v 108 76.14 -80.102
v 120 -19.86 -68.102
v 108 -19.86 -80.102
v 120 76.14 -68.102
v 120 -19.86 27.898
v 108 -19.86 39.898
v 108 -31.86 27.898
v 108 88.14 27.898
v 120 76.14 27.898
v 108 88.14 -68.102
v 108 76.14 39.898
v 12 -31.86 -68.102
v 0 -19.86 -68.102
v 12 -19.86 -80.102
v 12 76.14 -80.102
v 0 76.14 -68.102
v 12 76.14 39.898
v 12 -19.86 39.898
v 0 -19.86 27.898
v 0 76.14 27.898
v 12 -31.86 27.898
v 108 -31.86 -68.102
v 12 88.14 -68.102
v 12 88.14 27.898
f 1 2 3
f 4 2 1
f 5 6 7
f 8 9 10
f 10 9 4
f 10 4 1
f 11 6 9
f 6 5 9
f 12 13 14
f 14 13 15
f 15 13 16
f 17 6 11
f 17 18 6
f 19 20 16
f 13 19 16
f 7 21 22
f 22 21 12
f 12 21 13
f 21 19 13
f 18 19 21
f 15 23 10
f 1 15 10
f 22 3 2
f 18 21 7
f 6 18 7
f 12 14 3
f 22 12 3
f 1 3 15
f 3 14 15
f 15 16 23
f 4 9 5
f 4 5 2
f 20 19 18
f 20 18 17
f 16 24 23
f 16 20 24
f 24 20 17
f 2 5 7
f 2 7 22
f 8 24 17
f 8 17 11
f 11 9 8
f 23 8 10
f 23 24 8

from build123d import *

# Parameters (mm, degrees)
SKETCH_1_W      = 120
SKETCH_1_H      = 120
EXTRUDE_1_DEPTH = 120
CHAMFER_1_SIZE  = 12


with BuildPart() as part:
    # 草图1 → 凸台-拉伸1 (new body)
    with BuildSketch(Plane(origin=(0, 0, 0), x_dir=(0, 0, -1), z_dir=(1, 0, 0))):
        with Locations((20.102245328, 28.139540774)):
            Rectangle(SKETCH_1_W, SKETCH_1_H)
    extrude(amount=EXTRUDE_1_DEPTH)

    # 倒角1
    chamfer_1_edges = [part.edges().sort_by_distance(p)[0] for p in [
        (120, 28.139540774, -80.102245328),
        (120, 88.139540774, -20.102245328),
        (120, 28.139540774, 39.897754672),
        (0, 88.139540774, -20.102245328),
        (0, 28.139540774, -80.102245328),
        (0, -31.860459226, -20.102245328),
        (0, 28.139540774, 39.897754672),
        (60, 88.139540774, 39.897754672),
        (60, 88.139540774, -80.102245328),
        (60, -31.860459226, -80.102245328),
        (60, -31.860459226, 39.897754672),
        (120, -31.860459226, -20.102245328),
    ]]
    chamfer(chamfer_1_edges, length=CHAMFER_1_SIZE)


solid = part.part
